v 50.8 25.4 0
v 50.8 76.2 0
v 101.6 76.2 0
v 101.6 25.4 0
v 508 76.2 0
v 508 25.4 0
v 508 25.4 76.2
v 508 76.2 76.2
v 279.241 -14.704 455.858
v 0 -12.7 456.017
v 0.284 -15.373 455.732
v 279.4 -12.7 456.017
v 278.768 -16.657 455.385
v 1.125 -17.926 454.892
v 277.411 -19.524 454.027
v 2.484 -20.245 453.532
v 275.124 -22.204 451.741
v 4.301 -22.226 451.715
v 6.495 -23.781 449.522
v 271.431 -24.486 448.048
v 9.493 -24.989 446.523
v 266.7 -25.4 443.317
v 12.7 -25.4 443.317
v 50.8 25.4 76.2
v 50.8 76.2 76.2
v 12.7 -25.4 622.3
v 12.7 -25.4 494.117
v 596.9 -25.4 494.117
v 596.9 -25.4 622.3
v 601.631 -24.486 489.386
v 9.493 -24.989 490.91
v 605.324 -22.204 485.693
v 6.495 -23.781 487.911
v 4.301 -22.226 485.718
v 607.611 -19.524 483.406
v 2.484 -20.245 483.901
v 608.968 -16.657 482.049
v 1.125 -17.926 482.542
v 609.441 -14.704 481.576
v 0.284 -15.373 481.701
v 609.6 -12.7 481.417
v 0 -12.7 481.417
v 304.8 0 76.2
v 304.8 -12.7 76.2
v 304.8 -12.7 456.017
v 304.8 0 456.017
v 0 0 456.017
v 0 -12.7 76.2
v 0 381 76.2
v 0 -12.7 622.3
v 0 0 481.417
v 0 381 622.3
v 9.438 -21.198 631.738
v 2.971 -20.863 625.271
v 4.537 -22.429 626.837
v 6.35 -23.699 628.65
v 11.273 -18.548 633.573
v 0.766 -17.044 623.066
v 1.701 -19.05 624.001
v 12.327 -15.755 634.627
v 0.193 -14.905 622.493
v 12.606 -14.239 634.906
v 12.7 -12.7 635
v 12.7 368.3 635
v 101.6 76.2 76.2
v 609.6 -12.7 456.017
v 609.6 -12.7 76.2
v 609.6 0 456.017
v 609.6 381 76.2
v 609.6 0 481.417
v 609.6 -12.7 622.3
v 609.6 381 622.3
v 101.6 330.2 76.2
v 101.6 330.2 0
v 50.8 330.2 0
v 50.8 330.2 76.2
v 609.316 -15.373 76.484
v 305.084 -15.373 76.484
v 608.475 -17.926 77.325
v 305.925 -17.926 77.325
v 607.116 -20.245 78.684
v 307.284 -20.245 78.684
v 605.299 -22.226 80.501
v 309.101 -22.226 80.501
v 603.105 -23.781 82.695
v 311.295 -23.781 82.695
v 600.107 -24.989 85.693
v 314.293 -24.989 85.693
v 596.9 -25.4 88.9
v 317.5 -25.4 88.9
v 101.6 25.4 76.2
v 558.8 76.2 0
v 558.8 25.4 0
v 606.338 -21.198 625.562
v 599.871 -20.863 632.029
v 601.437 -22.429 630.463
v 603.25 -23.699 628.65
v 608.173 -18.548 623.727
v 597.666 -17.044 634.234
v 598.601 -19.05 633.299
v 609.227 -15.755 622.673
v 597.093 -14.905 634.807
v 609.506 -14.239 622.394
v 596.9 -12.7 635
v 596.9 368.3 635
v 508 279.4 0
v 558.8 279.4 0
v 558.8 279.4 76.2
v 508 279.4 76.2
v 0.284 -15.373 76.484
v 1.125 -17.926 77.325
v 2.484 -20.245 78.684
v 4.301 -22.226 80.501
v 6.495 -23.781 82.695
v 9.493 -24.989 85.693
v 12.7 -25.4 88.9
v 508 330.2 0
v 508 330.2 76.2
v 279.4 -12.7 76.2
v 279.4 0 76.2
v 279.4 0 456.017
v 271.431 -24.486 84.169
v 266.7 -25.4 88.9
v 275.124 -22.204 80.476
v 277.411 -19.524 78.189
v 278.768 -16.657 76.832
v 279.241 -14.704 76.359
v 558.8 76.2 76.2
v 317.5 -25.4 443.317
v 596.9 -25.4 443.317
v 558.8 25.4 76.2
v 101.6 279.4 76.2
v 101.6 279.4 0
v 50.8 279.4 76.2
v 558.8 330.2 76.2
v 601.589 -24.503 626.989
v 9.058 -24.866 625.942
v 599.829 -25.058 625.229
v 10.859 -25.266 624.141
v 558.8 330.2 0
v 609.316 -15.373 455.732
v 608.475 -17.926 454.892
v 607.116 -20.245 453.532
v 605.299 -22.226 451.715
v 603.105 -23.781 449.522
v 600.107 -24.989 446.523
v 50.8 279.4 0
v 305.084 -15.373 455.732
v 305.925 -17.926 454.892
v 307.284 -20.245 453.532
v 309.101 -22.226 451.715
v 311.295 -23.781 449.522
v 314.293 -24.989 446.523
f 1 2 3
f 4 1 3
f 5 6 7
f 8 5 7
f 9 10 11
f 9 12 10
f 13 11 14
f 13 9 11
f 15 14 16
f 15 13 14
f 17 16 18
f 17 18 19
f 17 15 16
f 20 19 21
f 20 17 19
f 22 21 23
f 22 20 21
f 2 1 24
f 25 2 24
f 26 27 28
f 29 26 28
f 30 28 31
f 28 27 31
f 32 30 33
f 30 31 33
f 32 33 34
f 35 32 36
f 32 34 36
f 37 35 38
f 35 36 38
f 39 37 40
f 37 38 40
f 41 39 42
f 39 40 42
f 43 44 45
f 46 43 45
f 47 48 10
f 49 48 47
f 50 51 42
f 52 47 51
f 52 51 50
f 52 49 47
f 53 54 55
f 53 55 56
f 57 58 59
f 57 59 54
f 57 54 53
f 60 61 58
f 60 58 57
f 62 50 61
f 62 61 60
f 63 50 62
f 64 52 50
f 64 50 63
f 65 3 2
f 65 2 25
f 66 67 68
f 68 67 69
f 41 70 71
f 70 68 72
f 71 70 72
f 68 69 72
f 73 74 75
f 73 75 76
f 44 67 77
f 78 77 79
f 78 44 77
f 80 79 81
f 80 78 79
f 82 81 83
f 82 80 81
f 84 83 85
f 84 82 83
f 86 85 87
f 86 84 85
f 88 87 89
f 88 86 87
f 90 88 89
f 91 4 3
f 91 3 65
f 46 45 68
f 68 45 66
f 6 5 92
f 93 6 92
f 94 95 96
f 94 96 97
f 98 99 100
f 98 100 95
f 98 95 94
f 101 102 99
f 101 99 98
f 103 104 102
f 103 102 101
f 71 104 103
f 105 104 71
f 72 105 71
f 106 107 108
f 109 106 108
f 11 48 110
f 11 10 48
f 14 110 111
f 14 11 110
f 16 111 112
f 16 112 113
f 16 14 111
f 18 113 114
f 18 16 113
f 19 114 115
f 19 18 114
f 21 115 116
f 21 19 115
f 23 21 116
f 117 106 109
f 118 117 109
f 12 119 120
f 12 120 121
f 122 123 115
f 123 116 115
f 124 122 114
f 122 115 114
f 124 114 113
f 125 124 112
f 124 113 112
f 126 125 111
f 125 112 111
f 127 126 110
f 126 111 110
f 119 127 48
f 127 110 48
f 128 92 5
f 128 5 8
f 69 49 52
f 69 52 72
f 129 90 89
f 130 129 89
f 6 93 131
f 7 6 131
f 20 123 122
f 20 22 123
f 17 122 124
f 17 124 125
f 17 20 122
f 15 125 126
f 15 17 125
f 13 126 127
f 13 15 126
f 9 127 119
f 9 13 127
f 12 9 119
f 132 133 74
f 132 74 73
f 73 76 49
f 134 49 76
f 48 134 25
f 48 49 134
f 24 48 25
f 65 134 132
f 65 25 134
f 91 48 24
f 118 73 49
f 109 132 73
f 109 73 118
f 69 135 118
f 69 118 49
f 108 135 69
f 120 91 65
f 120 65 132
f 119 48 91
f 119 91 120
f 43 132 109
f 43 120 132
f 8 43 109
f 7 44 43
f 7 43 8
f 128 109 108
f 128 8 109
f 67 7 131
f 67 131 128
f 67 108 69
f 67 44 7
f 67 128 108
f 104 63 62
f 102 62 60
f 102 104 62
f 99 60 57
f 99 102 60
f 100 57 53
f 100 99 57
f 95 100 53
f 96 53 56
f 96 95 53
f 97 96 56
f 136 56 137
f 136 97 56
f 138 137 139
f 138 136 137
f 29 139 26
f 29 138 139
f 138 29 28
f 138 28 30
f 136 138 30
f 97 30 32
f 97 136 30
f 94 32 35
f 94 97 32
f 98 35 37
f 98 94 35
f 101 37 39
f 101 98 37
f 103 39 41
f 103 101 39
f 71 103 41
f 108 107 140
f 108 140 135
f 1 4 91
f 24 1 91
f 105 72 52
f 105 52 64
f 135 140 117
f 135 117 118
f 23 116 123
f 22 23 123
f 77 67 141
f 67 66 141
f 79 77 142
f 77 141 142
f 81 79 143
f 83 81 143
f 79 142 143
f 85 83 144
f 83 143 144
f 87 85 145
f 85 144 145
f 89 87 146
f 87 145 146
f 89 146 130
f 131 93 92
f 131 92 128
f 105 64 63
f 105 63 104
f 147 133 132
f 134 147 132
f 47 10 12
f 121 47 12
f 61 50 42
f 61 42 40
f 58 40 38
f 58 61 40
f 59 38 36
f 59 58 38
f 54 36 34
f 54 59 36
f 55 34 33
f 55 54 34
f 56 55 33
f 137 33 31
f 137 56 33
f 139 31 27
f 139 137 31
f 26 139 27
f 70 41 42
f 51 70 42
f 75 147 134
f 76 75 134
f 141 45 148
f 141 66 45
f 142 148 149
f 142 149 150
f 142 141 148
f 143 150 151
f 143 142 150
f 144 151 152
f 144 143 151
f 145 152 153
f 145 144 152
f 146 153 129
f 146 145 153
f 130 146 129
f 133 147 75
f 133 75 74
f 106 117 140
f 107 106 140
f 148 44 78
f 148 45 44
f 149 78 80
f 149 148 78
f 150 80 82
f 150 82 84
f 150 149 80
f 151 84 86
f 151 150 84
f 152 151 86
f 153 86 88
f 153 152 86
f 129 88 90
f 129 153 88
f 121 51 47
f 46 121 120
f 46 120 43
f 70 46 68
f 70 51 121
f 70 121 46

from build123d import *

# Parameters (mm, degrees)
F0_W         = 609.6
F0_H         = 381
F1_DEPTH     = 635
F2_DEPTH     = 25.4
F3_W         = 50.8
F3_H         = 76.2
F3_W_2       = 406.4
F4_DEPTH     = 1574.8
F5_W         = 50.8
F5_H         = 76.2
F5_W_2       = 203.2
F6_DEPTH     = 970.28
F7_W         = 25.4
F7_H         = 379.8168087482
F8_DEPTH     = 25.4
F9_R         = 12.7
F10_T1_DEPTH = 459.0207478943
F10_T3_DEPTH = 674.9207478943


# Not quite as in the source:
# - a fillet or chamfer that OpenCascade refuses, or shapes differently, is made with other operations: its cross-section is extruded or revolved along the edge and cut away or added


with BuildPart() as f1:
    # F0 (on Top) → F1 (new body)
    with BuildSketch(Plane.XY):
        with Locations((304.8, 190.5)):
            Rectangle(F0_W, F0_H)
    extrude(amount=F1_DEPTH)

    # F2 (add): a face of the model
    f2_faces = [f1.faces().sort_by_distance(p)[0] for p in [
        (304.8, 0, 317.5),
    ]]
    extrude(f2_faces, amount=F2_DEPTH)

    # F3 (on face) → F4 (cut)
    with BuildSketch(Plane.XZ.offset(25.4)):
        with Locations((25.4, 38.1)):
            Rectangle(F3_W, F3_H)
        with Locations((304.8, 38.1)):
            Rectangle(F3_W_2, F3_H)
        with Locations((584.2, 38.1)):
            Rectangle(F3_W, F3_H)
    extrude(amount=-F4_DEPTH, mode=Mode.SUBTRACT)

    # F5 (on face) → F6 (cut)
    with BuildSketch(Plane.YZ.offset(558.8)):
        with Locations((0, 38.1)):
            Rectangle(F5_W, F5_H)
        with Locations((177.8, 38.1)):
            Rectangle(F5_W_2, F5_H)
        with Locations((355.6, 38.1)):
            Rectangle(F5_W, F5_H)
    extrude(amount=-F6_DEPTH, mode=Mode.SUBTRACT)

    # F7 (on face) → F8 (cut)
    with BuildSketch(Plane.XZ.offset(25.4)):
        with Locations((292.1, 266.1084043741)):
            Rectangle(F7_W, F7_H)
        Polygon((609.6, 481.4168087482), (0, 481.4168087482), (0, 456.0168087482), (279.4, 456.0168087482), (304.8, 456.0168087482), (609.6, 456.0168087482), align=None)
    extrude(amount=-F8_DEPTH, mode=Mode.SUBTRACT)

    # F9
    f9_edges = [f1.edges().sort_by_distance(p)[0] for p in [
        (609.6, -25.4, 558.208404),
        (304.8, -25.4, 635),
        (0, -25.4, 558.208404),
        (304.8, -25.4, 481.416809),
        (279.4, -25.4, 266.108404),
        (139.7, -25.4, 456.016809),
        (0, -25.4, 266.108404),
        (139.7, -25.4, 76.2),
        (609.6, -25.4, 266.108404),
        (457.2, -25.4, 456.016809),
        (304.8, -25.4, 266.108404),
        (457.2, -25.4, 76.2),
    ]]
    fillet(f9_edges, radius=F9_R)

    # F10: chamfer of 12.7 on 4 edges, made by hand

    # F10_s2 → F10_t1 (cut)
    with BuildSketch(Plane.XZ.offset(-413.6603739472)):
        Polygon((0, 622.3), (12.7, 635), (0, 635), align=None)
        Polygon((596.9, 635), (609.6, 622.3), (609.6, 635), align=None)
    extrude(amount=F10_T1_DEPTH, mode=Mode.SUBTRACT)

    # F10_s4 → F10_t3 (cut)
    with BuildSketch(Plane.YZ.offset(-32.6603739472)):
        Polygon((381, 622.3), (368.3, 635), (381, 635), align=None)
    extrude(amount=F10_T3_DEPTH, mode=Mode.SUBTRACT)


solid = f1.part
